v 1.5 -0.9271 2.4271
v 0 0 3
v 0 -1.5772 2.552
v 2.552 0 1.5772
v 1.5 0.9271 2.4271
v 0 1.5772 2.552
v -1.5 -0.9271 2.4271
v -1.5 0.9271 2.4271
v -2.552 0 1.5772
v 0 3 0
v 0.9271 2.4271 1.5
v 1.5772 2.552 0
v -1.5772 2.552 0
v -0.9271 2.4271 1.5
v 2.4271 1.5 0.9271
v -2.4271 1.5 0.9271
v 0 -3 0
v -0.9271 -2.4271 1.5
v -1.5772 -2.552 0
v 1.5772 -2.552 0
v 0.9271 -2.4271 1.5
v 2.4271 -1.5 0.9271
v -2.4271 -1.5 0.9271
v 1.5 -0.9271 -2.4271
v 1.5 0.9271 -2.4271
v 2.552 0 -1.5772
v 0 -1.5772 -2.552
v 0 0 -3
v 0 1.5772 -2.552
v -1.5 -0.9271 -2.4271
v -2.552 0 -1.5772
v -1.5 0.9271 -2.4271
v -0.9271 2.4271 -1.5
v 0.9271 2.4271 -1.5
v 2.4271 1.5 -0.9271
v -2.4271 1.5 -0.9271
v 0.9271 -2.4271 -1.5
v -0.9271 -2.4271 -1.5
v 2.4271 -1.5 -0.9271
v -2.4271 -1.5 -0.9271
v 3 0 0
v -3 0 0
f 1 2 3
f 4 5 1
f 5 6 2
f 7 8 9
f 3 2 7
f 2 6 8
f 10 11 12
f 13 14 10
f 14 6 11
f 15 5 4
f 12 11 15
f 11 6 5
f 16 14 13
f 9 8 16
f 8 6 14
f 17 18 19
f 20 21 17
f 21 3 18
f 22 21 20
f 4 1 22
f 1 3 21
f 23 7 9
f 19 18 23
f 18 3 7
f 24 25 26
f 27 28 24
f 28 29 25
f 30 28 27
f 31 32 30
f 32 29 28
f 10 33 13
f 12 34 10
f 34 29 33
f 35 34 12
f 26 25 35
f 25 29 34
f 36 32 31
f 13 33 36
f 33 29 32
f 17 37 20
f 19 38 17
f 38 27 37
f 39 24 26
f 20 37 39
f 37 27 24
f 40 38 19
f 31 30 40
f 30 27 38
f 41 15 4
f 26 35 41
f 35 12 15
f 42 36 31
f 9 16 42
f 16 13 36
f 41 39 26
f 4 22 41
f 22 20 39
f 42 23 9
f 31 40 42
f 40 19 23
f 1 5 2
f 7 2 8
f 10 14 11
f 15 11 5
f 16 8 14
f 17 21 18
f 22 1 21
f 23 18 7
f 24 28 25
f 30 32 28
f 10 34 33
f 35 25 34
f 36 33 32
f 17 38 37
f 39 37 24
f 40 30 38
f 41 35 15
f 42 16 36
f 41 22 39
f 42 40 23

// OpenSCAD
include <ship_lib.scad>
E2=len(geo_edges(2)); V2=len(geo_pts(2)); F2=len(geo_tris(2));
echo("f=2  V",V2," E",E2," F",F2,"   V-E+F =",V2-E2+F2,"(want 2)");
echo("myring d=4: r(0)",myring_r(0,4,3,6,5)," r(a)",myring_r(3,4,3,6,5),
     " r(a+b)",myring_r(9,4,3,6,5)," r(end)",myring_r(14,4,3,6,5));
echo("gielis starfish m=5 n=.3: r(0)",gielis_r(0,5,0.3,0.3,0.3),
     " r(36)",gielis_r(36,5,0.3,0.3,0.3));
echo("gielis diatom m=6 n1=40: r(0)",gielis_r(0,6,40,10,10),
     " r(30)",gielis_r(30,6,40,10,10));
geo_ball(3,2);
